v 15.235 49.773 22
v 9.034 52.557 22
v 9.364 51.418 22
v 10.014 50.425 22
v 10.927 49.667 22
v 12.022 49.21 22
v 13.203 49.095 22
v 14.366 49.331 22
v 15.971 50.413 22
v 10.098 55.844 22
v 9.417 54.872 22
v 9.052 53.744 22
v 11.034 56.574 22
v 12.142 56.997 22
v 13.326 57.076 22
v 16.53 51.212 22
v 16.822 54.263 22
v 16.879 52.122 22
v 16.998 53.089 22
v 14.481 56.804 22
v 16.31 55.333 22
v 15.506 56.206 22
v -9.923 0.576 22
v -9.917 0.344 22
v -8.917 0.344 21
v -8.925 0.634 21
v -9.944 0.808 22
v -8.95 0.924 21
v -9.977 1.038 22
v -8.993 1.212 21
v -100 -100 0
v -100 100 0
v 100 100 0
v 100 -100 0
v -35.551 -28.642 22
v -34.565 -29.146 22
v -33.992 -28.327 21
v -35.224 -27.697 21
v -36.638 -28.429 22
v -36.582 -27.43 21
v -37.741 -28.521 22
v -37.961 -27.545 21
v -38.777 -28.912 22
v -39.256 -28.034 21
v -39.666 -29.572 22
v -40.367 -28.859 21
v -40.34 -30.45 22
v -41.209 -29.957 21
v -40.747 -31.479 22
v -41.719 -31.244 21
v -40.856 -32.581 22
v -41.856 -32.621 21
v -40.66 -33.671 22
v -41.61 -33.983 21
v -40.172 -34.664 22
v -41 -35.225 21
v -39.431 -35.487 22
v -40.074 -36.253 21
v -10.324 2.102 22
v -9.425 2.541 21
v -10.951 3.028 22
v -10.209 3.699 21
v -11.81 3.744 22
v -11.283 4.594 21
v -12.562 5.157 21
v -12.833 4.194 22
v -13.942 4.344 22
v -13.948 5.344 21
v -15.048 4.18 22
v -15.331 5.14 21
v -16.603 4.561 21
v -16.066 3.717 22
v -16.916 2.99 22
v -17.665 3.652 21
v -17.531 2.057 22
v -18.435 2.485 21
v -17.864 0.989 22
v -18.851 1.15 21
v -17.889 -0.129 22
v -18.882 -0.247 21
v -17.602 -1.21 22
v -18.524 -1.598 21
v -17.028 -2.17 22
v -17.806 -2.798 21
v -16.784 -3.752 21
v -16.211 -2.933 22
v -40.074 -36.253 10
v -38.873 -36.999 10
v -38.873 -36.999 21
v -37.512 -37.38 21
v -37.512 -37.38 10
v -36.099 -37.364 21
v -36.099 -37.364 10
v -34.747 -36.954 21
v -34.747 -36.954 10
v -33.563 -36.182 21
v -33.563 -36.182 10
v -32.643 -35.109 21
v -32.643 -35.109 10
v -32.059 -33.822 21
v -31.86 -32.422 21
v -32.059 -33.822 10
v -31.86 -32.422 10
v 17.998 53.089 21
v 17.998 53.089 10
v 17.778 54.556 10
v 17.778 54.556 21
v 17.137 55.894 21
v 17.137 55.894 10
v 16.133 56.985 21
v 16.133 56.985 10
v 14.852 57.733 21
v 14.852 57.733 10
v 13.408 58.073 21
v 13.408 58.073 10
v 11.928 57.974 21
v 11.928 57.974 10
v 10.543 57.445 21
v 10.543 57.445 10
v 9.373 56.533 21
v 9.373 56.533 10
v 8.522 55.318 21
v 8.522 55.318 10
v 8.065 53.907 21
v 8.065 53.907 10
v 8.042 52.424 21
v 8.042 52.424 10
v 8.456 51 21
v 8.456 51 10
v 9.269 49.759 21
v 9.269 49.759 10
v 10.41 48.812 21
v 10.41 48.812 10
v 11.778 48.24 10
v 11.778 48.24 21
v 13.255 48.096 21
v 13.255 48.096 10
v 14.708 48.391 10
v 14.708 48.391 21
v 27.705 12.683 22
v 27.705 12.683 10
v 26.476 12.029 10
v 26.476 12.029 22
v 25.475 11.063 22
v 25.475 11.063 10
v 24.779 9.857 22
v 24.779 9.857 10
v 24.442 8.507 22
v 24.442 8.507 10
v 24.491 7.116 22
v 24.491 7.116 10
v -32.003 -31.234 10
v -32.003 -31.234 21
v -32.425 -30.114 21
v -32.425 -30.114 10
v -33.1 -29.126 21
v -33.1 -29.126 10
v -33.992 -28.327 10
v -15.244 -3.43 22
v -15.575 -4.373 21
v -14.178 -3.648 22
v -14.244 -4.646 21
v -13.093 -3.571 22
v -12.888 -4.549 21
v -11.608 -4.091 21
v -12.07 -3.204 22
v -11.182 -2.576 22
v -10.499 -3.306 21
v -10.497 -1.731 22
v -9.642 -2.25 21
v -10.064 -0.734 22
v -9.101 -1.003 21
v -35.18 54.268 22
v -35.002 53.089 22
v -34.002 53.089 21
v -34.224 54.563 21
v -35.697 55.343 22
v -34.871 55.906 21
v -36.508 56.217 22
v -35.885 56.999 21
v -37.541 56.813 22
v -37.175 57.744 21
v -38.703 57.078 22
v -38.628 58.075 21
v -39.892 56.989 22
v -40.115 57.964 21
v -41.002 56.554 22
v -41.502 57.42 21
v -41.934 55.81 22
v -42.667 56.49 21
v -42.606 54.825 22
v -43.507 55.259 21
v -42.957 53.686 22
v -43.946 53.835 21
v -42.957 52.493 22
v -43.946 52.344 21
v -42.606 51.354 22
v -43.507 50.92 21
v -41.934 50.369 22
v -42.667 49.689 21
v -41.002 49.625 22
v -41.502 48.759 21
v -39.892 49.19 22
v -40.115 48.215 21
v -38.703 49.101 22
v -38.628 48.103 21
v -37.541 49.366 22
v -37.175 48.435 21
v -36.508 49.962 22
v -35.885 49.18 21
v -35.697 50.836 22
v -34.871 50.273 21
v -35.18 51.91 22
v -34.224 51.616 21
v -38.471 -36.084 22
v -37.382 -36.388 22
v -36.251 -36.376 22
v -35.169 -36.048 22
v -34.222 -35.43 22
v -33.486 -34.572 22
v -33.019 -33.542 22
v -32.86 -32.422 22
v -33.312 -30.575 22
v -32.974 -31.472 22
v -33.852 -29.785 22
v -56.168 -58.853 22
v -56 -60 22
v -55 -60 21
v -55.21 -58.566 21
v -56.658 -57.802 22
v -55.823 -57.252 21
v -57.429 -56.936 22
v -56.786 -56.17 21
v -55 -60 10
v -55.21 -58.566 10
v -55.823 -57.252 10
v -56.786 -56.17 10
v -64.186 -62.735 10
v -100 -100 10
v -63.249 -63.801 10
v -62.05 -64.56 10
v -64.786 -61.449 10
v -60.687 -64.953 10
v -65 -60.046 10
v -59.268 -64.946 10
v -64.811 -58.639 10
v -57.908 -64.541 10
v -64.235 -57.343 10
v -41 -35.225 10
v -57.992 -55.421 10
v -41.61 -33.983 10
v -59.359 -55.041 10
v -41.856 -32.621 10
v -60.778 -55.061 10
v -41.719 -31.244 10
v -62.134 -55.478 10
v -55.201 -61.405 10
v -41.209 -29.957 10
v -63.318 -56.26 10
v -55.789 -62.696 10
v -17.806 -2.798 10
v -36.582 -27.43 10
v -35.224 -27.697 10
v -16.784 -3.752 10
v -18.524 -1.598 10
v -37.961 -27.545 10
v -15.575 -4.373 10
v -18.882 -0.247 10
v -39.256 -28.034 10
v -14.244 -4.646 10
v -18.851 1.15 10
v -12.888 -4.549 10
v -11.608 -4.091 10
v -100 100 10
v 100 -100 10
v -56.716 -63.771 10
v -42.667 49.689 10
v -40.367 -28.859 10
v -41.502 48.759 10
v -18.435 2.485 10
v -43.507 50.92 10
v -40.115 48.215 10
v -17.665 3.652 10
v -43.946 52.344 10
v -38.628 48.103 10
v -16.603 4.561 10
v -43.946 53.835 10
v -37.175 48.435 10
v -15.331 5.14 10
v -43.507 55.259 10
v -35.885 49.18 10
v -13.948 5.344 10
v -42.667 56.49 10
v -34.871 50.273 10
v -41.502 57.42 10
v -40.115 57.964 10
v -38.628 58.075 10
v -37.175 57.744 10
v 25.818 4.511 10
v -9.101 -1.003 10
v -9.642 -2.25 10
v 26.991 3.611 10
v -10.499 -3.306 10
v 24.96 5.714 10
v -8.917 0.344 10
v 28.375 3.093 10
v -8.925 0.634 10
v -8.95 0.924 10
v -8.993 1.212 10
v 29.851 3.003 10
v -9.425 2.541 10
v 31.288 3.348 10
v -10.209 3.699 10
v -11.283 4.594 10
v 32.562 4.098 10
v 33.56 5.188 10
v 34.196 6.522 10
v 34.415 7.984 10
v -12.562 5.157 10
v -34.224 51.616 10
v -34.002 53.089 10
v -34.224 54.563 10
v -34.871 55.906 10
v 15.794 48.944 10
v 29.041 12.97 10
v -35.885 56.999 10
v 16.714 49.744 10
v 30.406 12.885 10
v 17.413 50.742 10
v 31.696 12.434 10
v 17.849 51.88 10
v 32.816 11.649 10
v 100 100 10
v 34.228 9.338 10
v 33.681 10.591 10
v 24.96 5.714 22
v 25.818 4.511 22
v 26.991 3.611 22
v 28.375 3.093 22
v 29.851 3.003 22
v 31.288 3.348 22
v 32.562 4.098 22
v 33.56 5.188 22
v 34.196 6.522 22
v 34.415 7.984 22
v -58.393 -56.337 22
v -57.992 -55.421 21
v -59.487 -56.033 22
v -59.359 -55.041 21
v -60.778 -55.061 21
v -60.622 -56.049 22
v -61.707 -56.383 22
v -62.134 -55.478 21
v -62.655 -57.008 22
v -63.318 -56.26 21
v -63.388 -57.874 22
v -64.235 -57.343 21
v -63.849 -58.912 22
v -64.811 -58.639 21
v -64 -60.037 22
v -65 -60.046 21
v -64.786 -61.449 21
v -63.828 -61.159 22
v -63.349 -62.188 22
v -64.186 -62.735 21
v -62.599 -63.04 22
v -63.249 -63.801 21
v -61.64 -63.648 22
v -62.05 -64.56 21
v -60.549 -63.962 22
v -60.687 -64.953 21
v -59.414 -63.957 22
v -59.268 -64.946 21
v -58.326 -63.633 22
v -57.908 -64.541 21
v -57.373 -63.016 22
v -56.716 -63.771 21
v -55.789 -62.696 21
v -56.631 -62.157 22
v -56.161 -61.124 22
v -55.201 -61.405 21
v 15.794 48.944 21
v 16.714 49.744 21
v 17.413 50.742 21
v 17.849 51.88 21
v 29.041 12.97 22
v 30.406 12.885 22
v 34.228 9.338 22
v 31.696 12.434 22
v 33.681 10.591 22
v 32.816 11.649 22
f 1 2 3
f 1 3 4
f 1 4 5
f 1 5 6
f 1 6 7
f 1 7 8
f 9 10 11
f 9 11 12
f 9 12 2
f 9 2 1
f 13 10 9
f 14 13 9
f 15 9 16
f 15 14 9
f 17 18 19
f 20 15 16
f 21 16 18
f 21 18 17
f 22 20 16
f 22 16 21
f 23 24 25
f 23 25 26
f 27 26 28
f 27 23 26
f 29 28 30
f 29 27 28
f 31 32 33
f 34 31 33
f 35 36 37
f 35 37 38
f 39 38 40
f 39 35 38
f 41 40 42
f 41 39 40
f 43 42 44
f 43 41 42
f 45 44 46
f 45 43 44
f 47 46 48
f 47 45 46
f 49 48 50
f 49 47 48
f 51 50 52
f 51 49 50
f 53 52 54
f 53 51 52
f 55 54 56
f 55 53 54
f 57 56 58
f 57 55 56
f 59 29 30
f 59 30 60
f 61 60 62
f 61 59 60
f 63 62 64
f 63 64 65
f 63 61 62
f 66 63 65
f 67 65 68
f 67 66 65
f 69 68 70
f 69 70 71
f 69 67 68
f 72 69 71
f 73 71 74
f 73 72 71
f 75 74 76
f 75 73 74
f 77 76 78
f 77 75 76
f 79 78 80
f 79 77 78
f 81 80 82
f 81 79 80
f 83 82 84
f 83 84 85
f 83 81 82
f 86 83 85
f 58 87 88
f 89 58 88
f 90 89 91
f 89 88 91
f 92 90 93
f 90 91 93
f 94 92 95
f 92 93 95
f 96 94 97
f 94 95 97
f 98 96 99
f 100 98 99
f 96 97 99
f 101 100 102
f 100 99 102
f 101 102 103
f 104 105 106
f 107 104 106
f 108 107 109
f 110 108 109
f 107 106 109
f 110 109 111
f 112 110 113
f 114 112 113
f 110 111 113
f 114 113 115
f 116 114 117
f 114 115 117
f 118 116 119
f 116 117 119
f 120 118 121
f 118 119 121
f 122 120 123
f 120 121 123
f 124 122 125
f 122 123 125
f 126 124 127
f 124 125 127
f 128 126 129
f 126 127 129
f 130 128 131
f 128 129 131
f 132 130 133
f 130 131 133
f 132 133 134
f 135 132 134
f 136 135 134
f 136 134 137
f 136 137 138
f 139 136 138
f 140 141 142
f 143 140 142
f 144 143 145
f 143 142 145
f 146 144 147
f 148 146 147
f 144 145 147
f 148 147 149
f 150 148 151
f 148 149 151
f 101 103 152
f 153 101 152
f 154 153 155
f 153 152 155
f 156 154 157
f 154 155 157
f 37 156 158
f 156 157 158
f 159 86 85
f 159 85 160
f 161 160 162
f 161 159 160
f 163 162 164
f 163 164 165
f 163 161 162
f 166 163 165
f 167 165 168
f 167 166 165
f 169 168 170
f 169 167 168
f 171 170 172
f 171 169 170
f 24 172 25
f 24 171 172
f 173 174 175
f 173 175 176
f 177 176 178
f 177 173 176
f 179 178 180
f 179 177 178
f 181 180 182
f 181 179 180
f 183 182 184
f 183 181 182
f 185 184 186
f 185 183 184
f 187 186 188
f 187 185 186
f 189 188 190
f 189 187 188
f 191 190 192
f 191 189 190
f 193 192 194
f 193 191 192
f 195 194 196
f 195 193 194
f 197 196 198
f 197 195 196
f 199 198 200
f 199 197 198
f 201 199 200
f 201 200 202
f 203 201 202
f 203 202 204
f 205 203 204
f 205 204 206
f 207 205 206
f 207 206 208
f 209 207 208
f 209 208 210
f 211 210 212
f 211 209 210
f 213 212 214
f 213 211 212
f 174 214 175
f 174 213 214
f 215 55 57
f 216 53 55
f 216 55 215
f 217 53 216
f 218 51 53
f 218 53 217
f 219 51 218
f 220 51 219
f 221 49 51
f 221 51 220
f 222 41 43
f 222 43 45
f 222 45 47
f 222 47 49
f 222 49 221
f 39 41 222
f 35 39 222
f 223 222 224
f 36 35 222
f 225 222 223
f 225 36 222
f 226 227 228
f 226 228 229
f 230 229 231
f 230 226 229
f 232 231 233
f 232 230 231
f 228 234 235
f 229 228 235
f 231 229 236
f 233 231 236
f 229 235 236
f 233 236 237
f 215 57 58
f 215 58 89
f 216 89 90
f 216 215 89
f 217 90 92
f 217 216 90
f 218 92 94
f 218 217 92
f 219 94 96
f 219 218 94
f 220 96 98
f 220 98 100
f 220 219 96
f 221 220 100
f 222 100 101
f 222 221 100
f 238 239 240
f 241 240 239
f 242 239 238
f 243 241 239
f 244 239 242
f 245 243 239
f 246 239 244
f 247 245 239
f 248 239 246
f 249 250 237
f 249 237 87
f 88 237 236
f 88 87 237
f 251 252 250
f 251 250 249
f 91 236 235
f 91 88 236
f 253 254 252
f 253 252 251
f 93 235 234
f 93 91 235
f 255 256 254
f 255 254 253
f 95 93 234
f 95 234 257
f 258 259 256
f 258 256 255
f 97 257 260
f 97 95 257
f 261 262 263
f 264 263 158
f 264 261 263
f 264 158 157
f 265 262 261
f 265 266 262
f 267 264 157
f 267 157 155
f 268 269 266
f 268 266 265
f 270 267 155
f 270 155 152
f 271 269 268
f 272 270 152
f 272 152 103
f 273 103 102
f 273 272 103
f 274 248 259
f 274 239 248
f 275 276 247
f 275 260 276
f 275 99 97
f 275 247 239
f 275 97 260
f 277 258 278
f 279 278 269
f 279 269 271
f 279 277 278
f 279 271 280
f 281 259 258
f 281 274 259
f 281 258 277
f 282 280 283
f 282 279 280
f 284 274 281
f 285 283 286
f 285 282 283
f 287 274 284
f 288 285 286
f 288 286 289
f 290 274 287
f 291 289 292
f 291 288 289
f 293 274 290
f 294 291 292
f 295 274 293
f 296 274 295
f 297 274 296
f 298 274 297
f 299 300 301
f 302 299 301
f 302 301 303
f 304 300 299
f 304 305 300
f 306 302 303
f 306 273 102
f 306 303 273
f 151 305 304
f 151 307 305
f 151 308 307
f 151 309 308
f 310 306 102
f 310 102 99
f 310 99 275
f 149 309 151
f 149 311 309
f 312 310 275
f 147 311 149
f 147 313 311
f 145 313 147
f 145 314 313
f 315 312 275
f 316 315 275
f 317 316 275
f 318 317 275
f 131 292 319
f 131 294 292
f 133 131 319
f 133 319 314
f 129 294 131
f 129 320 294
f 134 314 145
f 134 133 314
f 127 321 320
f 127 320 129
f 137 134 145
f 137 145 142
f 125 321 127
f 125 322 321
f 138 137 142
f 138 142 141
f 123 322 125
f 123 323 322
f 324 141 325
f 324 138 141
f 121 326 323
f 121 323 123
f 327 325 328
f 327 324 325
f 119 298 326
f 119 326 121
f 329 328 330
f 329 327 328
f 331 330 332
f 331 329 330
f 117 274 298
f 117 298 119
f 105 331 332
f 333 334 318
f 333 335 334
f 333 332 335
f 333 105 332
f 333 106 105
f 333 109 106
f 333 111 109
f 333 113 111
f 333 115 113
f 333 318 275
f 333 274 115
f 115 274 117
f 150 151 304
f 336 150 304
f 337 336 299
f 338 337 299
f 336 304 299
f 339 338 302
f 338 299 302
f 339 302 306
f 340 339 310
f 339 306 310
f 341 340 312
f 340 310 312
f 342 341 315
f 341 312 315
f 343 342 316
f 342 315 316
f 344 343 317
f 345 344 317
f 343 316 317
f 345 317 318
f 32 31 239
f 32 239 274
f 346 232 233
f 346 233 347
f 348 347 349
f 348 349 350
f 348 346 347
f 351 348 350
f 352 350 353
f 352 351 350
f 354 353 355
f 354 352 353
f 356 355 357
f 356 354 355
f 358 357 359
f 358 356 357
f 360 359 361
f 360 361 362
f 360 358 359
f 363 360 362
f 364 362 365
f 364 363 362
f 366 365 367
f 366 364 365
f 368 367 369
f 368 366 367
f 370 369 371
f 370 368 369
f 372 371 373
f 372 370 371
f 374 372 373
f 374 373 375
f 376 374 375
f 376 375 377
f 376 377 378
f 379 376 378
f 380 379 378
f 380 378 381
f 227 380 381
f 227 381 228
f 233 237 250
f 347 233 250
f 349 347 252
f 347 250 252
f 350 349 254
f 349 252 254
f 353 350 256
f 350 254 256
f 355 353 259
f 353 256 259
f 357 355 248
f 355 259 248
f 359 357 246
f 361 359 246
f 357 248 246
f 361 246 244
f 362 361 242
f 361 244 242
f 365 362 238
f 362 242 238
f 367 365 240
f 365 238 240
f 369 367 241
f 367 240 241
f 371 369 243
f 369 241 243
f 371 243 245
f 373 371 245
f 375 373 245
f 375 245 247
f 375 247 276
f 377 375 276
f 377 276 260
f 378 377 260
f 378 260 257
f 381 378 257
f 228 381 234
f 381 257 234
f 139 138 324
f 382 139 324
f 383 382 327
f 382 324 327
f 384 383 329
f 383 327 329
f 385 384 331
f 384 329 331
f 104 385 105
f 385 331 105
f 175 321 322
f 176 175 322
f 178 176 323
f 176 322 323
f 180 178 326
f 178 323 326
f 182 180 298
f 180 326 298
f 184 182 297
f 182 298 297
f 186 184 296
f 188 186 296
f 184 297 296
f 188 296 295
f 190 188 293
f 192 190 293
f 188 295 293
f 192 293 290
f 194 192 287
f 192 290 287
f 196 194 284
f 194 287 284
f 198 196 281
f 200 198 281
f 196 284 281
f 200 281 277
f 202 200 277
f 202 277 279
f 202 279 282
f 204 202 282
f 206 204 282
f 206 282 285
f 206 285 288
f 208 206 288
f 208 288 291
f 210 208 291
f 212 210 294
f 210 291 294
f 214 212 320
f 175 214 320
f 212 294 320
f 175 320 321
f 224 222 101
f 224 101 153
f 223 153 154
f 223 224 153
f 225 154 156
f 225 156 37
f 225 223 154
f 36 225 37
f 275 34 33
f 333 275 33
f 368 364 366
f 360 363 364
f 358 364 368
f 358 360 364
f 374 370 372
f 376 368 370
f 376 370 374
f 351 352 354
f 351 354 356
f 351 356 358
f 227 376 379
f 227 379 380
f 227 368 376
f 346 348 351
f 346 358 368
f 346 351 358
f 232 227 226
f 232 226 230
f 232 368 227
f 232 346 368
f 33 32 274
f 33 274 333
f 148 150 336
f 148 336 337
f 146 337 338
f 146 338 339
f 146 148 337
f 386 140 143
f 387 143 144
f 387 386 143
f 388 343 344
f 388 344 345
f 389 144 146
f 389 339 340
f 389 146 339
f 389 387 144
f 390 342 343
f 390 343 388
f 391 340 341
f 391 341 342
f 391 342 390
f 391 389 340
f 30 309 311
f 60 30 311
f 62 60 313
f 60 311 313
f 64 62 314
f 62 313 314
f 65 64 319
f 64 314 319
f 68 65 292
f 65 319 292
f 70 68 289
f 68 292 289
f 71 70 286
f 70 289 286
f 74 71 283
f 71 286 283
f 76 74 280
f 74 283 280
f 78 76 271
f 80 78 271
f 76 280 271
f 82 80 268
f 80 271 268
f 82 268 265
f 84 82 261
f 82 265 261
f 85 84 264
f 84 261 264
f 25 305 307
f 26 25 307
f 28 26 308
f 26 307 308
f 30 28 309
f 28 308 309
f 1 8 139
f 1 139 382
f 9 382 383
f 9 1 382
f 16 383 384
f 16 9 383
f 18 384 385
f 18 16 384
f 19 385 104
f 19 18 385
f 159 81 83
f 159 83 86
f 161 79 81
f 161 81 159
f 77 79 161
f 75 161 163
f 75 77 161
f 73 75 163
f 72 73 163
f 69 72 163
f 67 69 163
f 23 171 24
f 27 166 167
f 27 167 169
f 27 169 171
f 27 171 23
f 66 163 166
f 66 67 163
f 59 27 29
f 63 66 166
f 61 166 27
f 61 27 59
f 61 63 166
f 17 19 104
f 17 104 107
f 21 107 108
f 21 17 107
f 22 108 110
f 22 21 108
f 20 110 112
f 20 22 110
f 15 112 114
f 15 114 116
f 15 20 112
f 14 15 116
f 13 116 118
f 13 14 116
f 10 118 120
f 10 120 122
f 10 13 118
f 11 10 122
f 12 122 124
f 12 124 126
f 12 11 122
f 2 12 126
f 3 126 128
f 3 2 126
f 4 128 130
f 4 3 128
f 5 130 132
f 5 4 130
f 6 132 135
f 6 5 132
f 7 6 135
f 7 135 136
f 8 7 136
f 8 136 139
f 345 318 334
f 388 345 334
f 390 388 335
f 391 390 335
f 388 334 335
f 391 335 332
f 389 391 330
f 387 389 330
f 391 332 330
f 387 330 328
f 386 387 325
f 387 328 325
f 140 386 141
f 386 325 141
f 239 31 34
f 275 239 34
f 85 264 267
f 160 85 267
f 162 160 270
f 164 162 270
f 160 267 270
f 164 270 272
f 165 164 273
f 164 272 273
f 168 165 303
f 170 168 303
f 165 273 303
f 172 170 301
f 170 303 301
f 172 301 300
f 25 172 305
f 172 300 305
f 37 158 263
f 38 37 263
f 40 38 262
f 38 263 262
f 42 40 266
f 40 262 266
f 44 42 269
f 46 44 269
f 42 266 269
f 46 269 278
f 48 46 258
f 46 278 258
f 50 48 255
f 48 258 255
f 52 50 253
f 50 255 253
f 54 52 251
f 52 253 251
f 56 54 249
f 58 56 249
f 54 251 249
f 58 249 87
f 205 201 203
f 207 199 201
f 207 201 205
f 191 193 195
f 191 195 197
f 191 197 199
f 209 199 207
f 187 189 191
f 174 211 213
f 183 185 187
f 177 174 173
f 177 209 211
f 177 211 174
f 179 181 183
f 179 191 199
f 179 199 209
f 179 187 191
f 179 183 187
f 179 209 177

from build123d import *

# Parameters (mm, degrees)
F0_W     = 200
F0_H     = 200
F1_DEPTH = 10
F2_R     = 5
F3_DEPTH = 12
F4_SIZE  = 1


with BuildPart() as f1:
    # F0 (on Top) → F1 (new body)
    with BuildSketch(Plane.XY):
        Rectangle(F0_W, F0_H)
    extrude(amount=F1_DEPTH)

    # F2 (on face) → F3 (join)
    with BuildSketch(Plane.XY.offset(10)):
        with BuildLine():
            Line((-60, -60), (-55, -60))
            ThreePointArc((-55, -60), (-55.4684610648, -57.8869086913), (-56.7860619516, -56.1697777844))
            Line((-56.7860619516, -56.1697777844), (-60, -60))
        make_face()
        with Locations((-39.0020143443, 53.0894473389)):
            Circle(F2_R)
        with BuildLine():
            ThreePointArc((7.9979856557, 53.0894473389), (10.1301034739, 48.9936871175), (14.7080863723, 48.390984235))
            Line((14.7080863723, 48.390984235), (12.9979856557, 53.0894473389))
            Line((12.9979856557, 53.0894473389), (7.9979856557, 53.0894473389))
        make_face()
        with BuildLine():
            Line((12.9979856557, 53.0894473389), (14.7080863723, 48.390984235))
            ThreePointArc((14.7080863723, 48.390984235), (17.0937458771, 50.2215651572), (17.9979856557, 53.0894473389))
            ThreePointArc((17.9979856557, 53.0894473389), (12.9979856557, 58.0894473389), (7.9979856557, 53.0894473389))
            Line((7.9979856557, 53.0894473389), (12.9979856557, 53.0894473389))
        make_face()
        with BuildLine():
            ThreePointArc((27.7048518187, 12.6826646451), (25.0848255164, 10.4842015412), (24.4909137702, 7.1159606529))
            Line((24.4909137702, 7.1159606529), (29.4149525353, 7.9842015412))
            Line((29.4149525353, 7.9842015412), (27.7048518187, 12.6826646451))
        make_face()
        with BuildLine():
            Line((29.4149525353, 7.9842015412), (24.4909137702, 7.1159606529))
            ThreePointArc((24.4909137702, 7.1159606529), (29.850731249, 3.0032280507), (34.4149525353, 7.9842015412))
            ThreePointArc((34.4149525353, 7.9842015412), (32.282834717, 12.0799617626), (27.7048518187, 12.6826646451))
            Line((27.7048518187, 12.6826646451), (29.4149525353, 7.9842015412))
        make_face()
        with BuildLine():
            ThreePointArc((-8.9925498322, 1.2119226122), (-16.603086639, 4.5606389529), (-16.784470779, -3.7520784976))
            Line((-16.784470779, -3.7520784976), (-13.9165885972, 0.3436817238))
            Line((-13.9165885972, 0.3436817238), (-8.9925498322, 1.2119226122))
        make_face()
        with BuildLine():
            Line((-13.9165885972, 0.3436817238), (-16.784470779, -3.7520784976))
            ThreePointArc((-16.784470779, -3.7520784976), (-11.6078455311, -4.091372442), (-8.9165885972, 0.3436817238))
            ThreePointArc((-8.9165885972, 0.3436817238), (-8.9356151068, 0.7794604376), (-8.9925498322, 1.2119226122))
            Line((-8.9925498322, 1.2119226122), (-13.9165885972, 0.3436817238))
        make_face()
        with BuildLine():
            ThreePointArc((-33.9917638695, -28.3266398263), (-40.8264127527, -29.3785929027), (-40.0735840997, -36.2526222633))
            Line((-40.0735840997, -36.2526222633), (-36.8596460513, -32.4224000477))
            Line((-36.8596460513, -32.4224000477), (-33.9917638695, -28.3266398263))
        make_face()
        with BuildLine():
            Line((-36.8596460513, -32.4224000477), (-40.0735840997, -36.2526222633))
            ThreePointArc((-40.0735840997, -36.2526222633), (-34.7465547426, -36.9539389829), (-31.8596460513, -32.4224000477))
            ThreePointArc((-31.8596460513, -32.4224000477), (-32.4245918854, -30.1136569815), (-33.9917638695, -28.3266398263))
            Line((-33.9917638695, -28.3266398263), (-36.8596460513, -32.4224000477))
        make_face()
        with BuildLine():
            ThreePointArc((-56.7860619516, -56.1697777844), (-64.5315389352, -62.1130913087), (-55, -60))
            Line((-55, -60), (-60, -60))
            Line((-60, -60), (-56.7860619516, -56.1697777844))
        make_face()
    extrude(amount=F3_DEPTH)

    # F4
    f4_edges = [f1.edges().sort_by_distance(p)[0] for p in [
        (-63.213938, -63.830222, 22),
        (-33.645708, -28.592178, 22),
        (-11.048706, 4.439442, 22),
        (11.287885, 57.78791, 22),
        (-44.002014, 53.089447, 22),
    ]]
    chamfer(f4_edges, length=F4_SIZE)


solid = f1.part
